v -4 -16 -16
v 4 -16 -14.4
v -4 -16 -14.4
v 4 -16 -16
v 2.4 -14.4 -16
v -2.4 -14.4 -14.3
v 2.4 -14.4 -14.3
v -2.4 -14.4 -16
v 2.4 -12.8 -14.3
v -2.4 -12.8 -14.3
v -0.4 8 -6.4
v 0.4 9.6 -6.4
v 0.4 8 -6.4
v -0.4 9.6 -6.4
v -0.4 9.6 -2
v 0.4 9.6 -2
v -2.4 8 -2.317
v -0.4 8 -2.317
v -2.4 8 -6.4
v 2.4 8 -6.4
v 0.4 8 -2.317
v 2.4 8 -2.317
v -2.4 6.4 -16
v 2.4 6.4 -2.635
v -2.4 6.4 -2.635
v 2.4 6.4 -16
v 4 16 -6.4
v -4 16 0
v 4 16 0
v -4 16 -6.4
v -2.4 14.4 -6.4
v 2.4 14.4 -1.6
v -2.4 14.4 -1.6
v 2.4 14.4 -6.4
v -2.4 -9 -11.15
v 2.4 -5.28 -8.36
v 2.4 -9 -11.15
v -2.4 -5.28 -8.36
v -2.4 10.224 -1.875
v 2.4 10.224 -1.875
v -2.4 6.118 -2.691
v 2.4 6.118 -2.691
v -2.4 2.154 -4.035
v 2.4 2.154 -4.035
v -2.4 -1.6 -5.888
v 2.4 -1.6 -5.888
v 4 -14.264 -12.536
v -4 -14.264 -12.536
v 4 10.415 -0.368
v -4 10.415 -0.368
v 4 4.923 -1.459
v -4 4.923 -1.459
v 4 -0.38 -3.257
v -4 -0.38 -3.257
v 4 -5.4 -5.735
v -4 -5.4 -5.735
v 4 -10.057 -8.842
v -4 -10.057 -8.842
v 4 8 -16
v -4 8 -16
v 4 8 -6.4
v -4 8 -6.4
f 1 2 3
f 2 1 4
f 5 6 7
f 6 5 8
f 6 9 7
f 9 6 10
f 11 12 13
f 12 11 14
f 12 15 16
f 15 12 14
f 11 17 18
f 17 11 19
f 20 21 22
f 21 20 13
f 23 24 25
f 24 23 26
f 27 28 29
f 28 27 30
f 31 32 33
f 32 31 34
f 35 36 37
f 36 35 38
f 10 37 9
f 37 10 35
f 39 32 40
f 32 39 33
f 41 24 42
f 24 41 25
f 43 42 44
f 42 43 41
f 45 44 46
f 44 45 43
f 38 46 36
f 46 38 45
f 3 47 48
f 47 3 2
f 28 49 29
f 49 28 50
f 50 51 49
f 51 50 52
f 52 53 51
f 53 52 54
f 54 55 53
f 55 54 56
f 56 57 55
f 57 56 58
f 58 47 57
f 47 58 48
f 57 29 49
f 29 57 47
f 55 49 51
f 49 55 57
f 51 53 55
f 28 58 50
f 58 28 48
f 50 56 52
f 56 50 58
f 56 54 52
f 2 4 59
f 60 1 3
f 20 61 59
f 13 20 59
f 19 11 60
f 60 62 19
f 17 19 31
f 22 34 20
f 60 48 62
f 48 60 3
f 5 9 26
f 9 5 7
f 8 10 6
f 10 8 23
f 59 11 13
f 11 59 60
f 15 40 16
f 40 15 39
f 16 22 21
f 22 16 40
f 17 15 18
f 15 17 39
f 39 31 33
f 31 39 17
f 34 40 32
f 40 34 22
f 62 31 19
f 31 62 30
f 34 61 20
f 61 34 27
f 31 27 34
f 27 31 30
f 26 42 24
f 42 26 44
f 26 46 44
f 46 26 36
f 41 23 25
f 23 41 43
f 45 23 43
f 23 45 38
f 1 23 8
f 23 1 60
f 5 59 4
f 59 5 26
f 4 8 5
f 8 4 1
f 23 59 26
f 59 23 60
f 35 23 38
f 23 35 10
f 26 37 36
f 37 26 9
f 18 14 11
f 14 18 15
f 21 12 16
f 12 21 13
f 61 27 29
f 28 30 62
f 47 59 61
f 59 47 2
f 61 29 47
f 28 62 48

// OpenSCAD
// file: ../p/48/1-8edge.scad
use <../../lib.scad>
function ldraw_lib__48__1_8edge() = [
// 0 Hi-Res Circle 0.125
// 0 Name: 48\1-8edge.dat
// 0 Author: [PTadmin]
// 0 !LDRAW_ORG 48_Primitive UPDATE 2017-01
// 0 !LICENSE Licensed under CC BY 4.0 : see CAreadme.txt
// 
// 0 BFC CERTIFY CCW
  [0,"BFC","CERTIFY"],
  [0,"BFC","CCW"],
// 
// 0 !HISTORY 2000-09-30 [PTadmin] Official Update 2000-02
// 0 !HISTORY 2007-10-13 [PTadmin] Header formatted for Contributor Agreement
// 0 !HISTORY 2008-07-01 [PTadmin] Official Update 2008-01
// 0 !HISTORY 2017-01-17 [Steffen] added BFC CERTIFY statement
// 0 !HISTORY 2017-12-30 [PTadmin] Official Update 2017-01
// 
// 
// 2 24 1 0 0 0.9914 0 0.1305
  [2,24,1,0,0,0.9914,0,0.1305],
// 2 24 0.9914 0 0.1305 0.9659 0 0.2588
  [2,24,0.9914,0,0.1305,0.9659,0,0.2588],
// 2 24 0.9659 0 0.2588 0.9239 0 0.3827
  [2,24,0.9659,0,0.2588,0.9239,0,0.3827],
// 2 24 0.9239 0 0.3827 0.866 0 0.5
  [2,24,0.9239,0,0.3827,0.866,0,0.5],
// 2 24 0.866 0 0.5 0.7934 0 0.6088
  [2,24,0.866,0,0.5,0.7934,0,0.6088],
// 2 24 0.7934 0 0.6088 0.7071 0 0.7071
  [2,24,0.7934,0,0.6088,0.7071,0,0.7071],
];
module ldraw_lib__48__1_8edge(step=0, col=false, unit=2/5, alt=false, line=0.2, solid=!$preview)
    makepoly(ldraw_lib__48__1_8edge(), step=step, col=col, unit=unit, alt=alt, line=line, solid=solid);
ldraw_lib__48__1_8edge(line=0.2);
// file: ../p/48/1-8cyli.scad
use <../../lib.scad>
function ldraw_lib__48__1_8cyli() = [
// 0 Hi-Res Cylinder 0.125
// 0 Name: 48\1-8cyli.dat
// 0 Author: Steve Bliss [sbliss]
// 0 !LDRAW_ORG 48_Primitive UPDATE 2004-04
// 0 !LICENSE Licensed under CC BY 4.0 : see CAreadme.txt
// 
// 0 BFC CERTIFY CCW
  [0,"BFC","CERTIFY"],
  [0,"BFC","CCW"],
// 
// 0 !HISTORY 2000-05-07 [PTadmin] Official Update 2000-01
// 0 !HISTORY 2004-10-12 [sbliss] fixed title, BFC'ed
// 0 !HISTORY 2004-11-06 [PTadmin] Official Update 2004-04
// 0 !HISTORY 2007-06-24 [PTadmin] Header formatted for Contributor Agreement
// 0 !HISTORY 2008-07-01 [PTadmin] Official Update 2008-01
// 
// 
// 5 24 1 0 0 1 1 0 0.9914 0 0.1305 1 0 -1
  [5,24,1,0,0,1,1,0,0.9914,0,0.1305,1,0,-1],
// 5 24 0.9914 0 0.1305 0.9914 1 0.1305 0.9659 0 0.2588 1 0 0
  [5,24,0.9914,0,0.1305,0.9914,1,0.1305,0.9659,0,0.2588,1,0,0],
// 5 24 0.9659 0 0.2588 0.9659 1 0.2588 0.9239 0 0.3827 0.9914 0 0.1305
  [5,24,0.9659,0,0.2588,0.9659,1,0.2588,0.9239,0,0.3827,0.9914,0,0.1305],
// 5 24 0.9239 0 0.3827 0.9239 1 0.3827 0.8660 0 0.5000 0.9659 0 0.2588
  [5,24,0.9239,0,0.3827,0.9239,1,0.3827,0.8660,0,0.5000,0.9659,0,0.2588],
// 5 24 0.8660 0 0.5000 0.8660 1 0.5000 0.7934 0 0.6088 0.9239 0 0.3827
  [5,24,0.8660,0,0.5000,0.8660,1,0.5000,0.7934,0,0.6088,0.9239,0,0.3827],
// 5 24 0.7934 0 0.6088 0.7934 1 0.6088 0.7071 0 0.7071 0.8660 0 0.5000
  [5,24,0.7934,0,0.6088,0.7934,1,0.6088,0.7071,0,0.7071,0.8660,0,0.5000],
// 5 24 0.7071 0 0.7071 0.7071 1 0.7071 0.6088 0 0.7934 0.7934 0 0.6088
  [5,24,0.7071,0,0.7071,0.7071,1,0.7071,0.6088,0,0.7934,0.7934,0,0.6088],
// 
// 4 16 0.9914 1 0.1305 0.9914 0 0.1305 1 0 0 1 1 0
  [4,16,0.9914,1,0.1305,0.9914,0,0.1305,1,0,0,1,1,0],
// 4 16 0.9659 1 0.2588 0.9659 0 0.2588 0.9914 0 0.1305 0.9914 1 0.1305
  [4,16,0.9659,1,0.2588,0.9659,0,0.2588,0.9914,0,0.1305,0.9914,1,0.1305],
// 4 16 0.9239 1 0.3827 0.9239 0 0.3827 0.9659 0 0.2588 0.9659 1 0.2588
  [4,16,0.9239,1,0.3827,0.9239,0,0.3827,0.9659,0,0.2588,0.9659,1,0.2588],
// 4 16 0.8660 1 0.5000 0.8660 0 0.5000 0.9239 0 0.3827 0.9239 1 0.3827
  [4,16,0.8660,1,0.5000,0.8660,0,0.5000,0.9239,0,0.3827,0.9239,1,0.3827],
// 4 16 0.7934 1 0.6088 0.7934 0 0.6088 0.8660 0 0.5000 0.8660 1 0.5000
  [4,16,0.7934,1,0.6088,0.7934,0,0.6088,0.8660,0,0.5000,0.8660,1,0.5000],
// 4 16 0.7071 1 0.7071 0.7071 0 0.7071 0.7934 0 0.6088 0.7934 1 0.6088
  [4,16,0.7071,1,0.7071,0.7071,0,0.7071,0.7934,0,0.6088,0.7934,1,0.6088],
// 0
];
module ldraw_lib__48__1_8cyli(step=0, col=false, unit=2/5, alt=false, line=0.2, solid=!$preview)
    makepoly(ldraw_lib__48__1_8cyli(), step=step, col=col, unit=unit, alt=alt, line=line, solid=solid);
ldraw_lib__48__1_8cyli(line=0.2);
// file: ../p/rect3.scad
use <../lib.scad>
function ldraw_lib__rect3() = [
// 0 Rectangle with 3 Edges
// 0 Name: rect3.dat
// 0 Author: Mark Kennedy [mkennedy]
// 0 !LDRAW_ORG Primitive UPDATE 2010-01
// 0 !LICENSE Licensed under CC BY 4.0 : see CAreadme.txt
// 
// 0 BFC CERTIFY CCW
  [0,"BFC","CERTIFY"],
  [0,"BFC","CCW"],
// 
// 0 !HISTORY 2003-08-01 [PTadmin] Official Update 2003-02
// 0 !HISTORY 2007-06-24 [PTadmin] Header formatted for Contributor Agreement
// 0 !HISTORY 2008-07-01 [PTadmin] Official Update 2008-01
// 0 !HISTORY 2010-01-17 [mikeheide] Change winding to CCW
// 0 !HISTORY 2010-04-05 [PTadmin] Official Update 2010-01
// 
// 
// 2 24 1 0 1 -1 0 1
  [2,24,1,0,1,-1,0,1],
// 2 24 1 0 1 1 0 -1
  [2,24,1,0,1,1,0,-1],
// 2 24 -1 0 1 -1 0 -1
  [2,24,-1,0,1,-1,0,-1],
// 4 16 -1 0 1 -1 0 -1 1 0 -1 1 0 1
  [4,16,-1,0,1,-1,0,-1,1,0,-1,1,0,1],
// 0 //
];
module ldraw_lib__rect3(step=0, col=false, unit=2/5, alt=false, line=0.2, solid=!$preview)
    makepoly(ldraw_lib__rect3(), step=step, col=col, unit=unit, alt=alt, line=line, solid=solid);
ldraw_lib__rect3(line=0.2);
// file: ../p/rect2p.scad
use <../lib.scad>
function ldraw_lib__rect2p() = [
// 0 Rectangle with 2 Parallel Edges
// 0 Name: rect2p.dat
// 0 Author: Donald Sutter [technog]
// 0 !LDRAW_ORG Primitive UPDATE 2010-01
// 0 !LICENSE Licensed under CC BY 4.0 : see CAreadme.txt
// 
// 0 BFC CERTIFY CCW
  [0,"BFC","CERTIFY"],
  [0,"BFC","CCW"],
// 
// 0 !HISTORY 2003-08-01 [PTadmin] Official Update 2003-02
// 0 !HISTORY 2007-06-24 [PTadmin] Header formatted for Contributor Agreement
// 0 !HISTORY 2008-07-01 [PTadmin] Official Update 2008-01
// 0 !HISTORY 2010-01-17 [mikeheide] changed winding to CCW
// 0 !HISTORY 2010-04-05 [PTadmin] Official Update 2010-01
// 
// 
// 2 24 1 0 1 -1 0 1
  [2,24,1,0,1,-1,0,1],
// 2 24 -1 0 -1 1 0 -1
  [2,24,-1,0,-1,1,0,-1],
// 4 16 -1 0 1 -1 0 -1 1 0 -1 1 0 1
  [4,16,-1,0,1,-1,0,-1,1,0,-1,1,0,1],
// 0
];
module ldraw_lib__rect2p(step=0, col=false, unit=2/5, alt=false, line=0.2, solid=!$preview)
    makepoly(ldraw_lib__rect2p(), step=step, col=col, unit=unit, alt=alt, line=line, solid=solid);
ldraw_lib__rect2p(line=0.2);
// file: ../p/rect.scad
use <../lib.scad>
function ldraw_lib__rect() = [
// 0 Rectangle
// 0 Name: rect.dat
// 0 Author: James Jessiman
// 0 !LDRAW_ORG Primitive UPDATE 2010-01
// 0 !LICENSE Licensed under CC BY 4.0 : see CAreadme.txt
// 
// 0 BFC CERTIFY CCW
  [0,"BFC","CERTIFY"],
  [0,"BFC","CCW"],
// 
// 0 !HISTORY 2002-04-05 [hafhead] Added BFC statement
// 0 !HISTORY 2002-04-25 [PTadmin] Official Update 2002-02
// 0 !HISTORY 2007-06-24 [PTadmin] Header formatted for Contributor Agreement
// 0 !HISTORY 2008-07-01 [PTadmin] Official Update 2008-01
// 0 !HISTORY 2010-01-17 [mikeheide] changed winding to CCW
// 0 !HISTORY 2010-04-05 [PTadmin] Official Update 2010-01
// 
// 
// 2 24 1 0 1 -1 0 1
  [2,24,1,0,1,-1,0,1],
// 2 24 -1 0 1 -1 0 -1
  [2,24,-1,0,1,-1,0,-1],
// 2 24 -1 0 -1 1 0 -1
  [2,24,-1,0,-1,1,0,-1],
// 2 24 1 0 -1 1 0 1
  [2,24,1,0,-1,1,0,1],
// 4 16 -1 0 1 -1 0 -1 1 0 -1 1 0 1
  [4,16,-1,0,1,-1,0,-1,1,0,-1,1,0,1],
// 0
];
module ldraw_lib__rect(step=0, col=false, unit=2/5, alt=false, line=0.2, solid=!$preview)
    makepoly(ldraw_lib__rect(), step=step, col=col, unit=unit, alt=alt, line=line, solid=solid);
ldraw_lib__rect(line=0.2);
// file: ../p/box2-5.scad
use <../lib.scad>
function ldraw_lib__box2_5() = [
// 0 Box with 2 Faces without 5 Edges
// 0 Name: box2-5.dat
// 0 Author: Steffen [Steffen]
// 0 !LDRAW_ORG Primitive UPDATE 2003-03
// 0 !LICENSE Licensed under CC BY 4.0 : see CAreadme.txt
// 
// 0 BFC CERTIFY CCW
  [0,"BFC","CERTIFY"],
  [0,"BFC","CCW"],
// 
// 0 !HISTORY 2003-12-19 [PTadmin] Official Update 2003-03
// 0 !HISTORY 2007-06-24 [PTadmin] Header formatted for Contributor Agreement
// 0 !HISTORY 2008-07-01 [PTadmin] Official Update 2008-01
// 
// 
// 2 24 1 1 1 -1 1 1
  [2,24,1,1,1,-1,1,1],
// 2 24 1 1 -1 -1 1 -1
  [2,24,1,1,-1,-1,1,-1],
// 2 24 1 -1 1 -1 -1 1
  [2,24,1,-1,1,-1,-1,1],
// 2 24 -1 -1 1 -1 1 1
  [2,24,-1,-1,1,-1,1,1],
// 2 24 1 -1 1 1 1 1
  [2,24,1,-1,1,1,1,1],
// 2 24 -1 1 -1 -1 1 1
  [2,24,-1,1,-1,-1,1,1],
// 2 24 1 1 -1 1 1 1
  [2,24,1,1,-1,1,1,1],
// 4 16 1 1 1 1 1 -1 -1 1 -1 -1 1 1
  [4,16,1,1,1,1,1,-1,-1,1,-1,-1,1,1],
// 4 16 1 1 1 -1 1 1 -1 -1 1 1 -1 1
  [4,16,1,1,1,-1,1,1,-1,-1,1,1,-1,1],
// 0
];
module ldraw_lib__box2_5(step=0, col=false, unit=2/5, alt=false, line=0.2, solid=!$preview)
    makepoly(ldraw_lib__box2_5(), step=step, col=col, unit=unit, alt=alt, line=line, solid=solid);
ldraw_lib__box2_5(line=0.2);
// file: ../p/48/1-8cylo.scad
use <../../lib.scad>
use <1-8cyli.scad>
use <1-8edge.scad>
function ldraw_lib__48__1_8cylo() = [
// 0 Hi-Res Cylinder Open 0.125
// 0 Name: 48\1-8cylo.dat
// 0 Author: Max Martin Richter [MMR1988]
// 0 !LDRAW_ORG 48_Primitive UPDATE 2014-01
// 0 !LICENSE Licensed under CC BY 4.0 : see CAreadme.txt
// 
// 0 BFC CERTIFY CCW
  [0,"BFC","CERTIFY"],
  [0,"BFC","CCW"],
// 
// 0 !HISTORY 2014-06-21 [PTadmin] Official Update 2014-01
// 
// 
// 1 16 0 0 0 1 0 0 0 1 0 0 0 1 48\1-8edge.dat
  [1,16,0,0,0,1,0,0,0,1,0,0,0,1, ldraw_lib__48__1_8edge()],
// 1 16 0 1 0 1 0 0 0 1 0 0 0 1 48\1-8edge.dat
  [1,16,0,1,0,1,0,0,0,1,0,0,0,1, ldraw_lib__48__1_8edge()],
// 1 16 0 0 0 1 0 0 0 1 0 0 0 1 48\1-8cyli.dat
  [1,16,0,0,0,1,0,0,0,1,0,0,0,1, ldraw_lib__48__1_8cyli()],
];
module ldraw_lib__48__1_8cylo(step=0, col=false, unit=2/5, alt=false, line=0.2, solid=!$preview)
    makepoly(ldraw_lib__48__1_8cylo(), step=step, col=col, unit=unit, alt=alt, line=line, solid=solid);
ldraw_lib__48__1_8cylo(line=0.2);
// file: ../p/48/1-8chrd.scad
use <../../lib.scad>
function ldraw_lib__48__1_8chrd() = [
// 0 Hi-Res Chord 0.125
// 0 Name: 48\1-8chrd.dat
// 0 Author: Willy Tschager [Holly-Wood]
// 0 !LDRAW_ORG 48_Primitive UPDATE 2024-01
// 0 !LICENSE Licensed under CC BY 4.0 : see CAreadme.txt
// 
// 0 BFC CERTIFY CCW
  [0,"BFC","CERTIFY"],
  [0,"BFC","CCW"],
// 
// 0 !HISTORY 2009-05-02 [PTadmin] Official Update 2009-01
// 0 !HISTORY 2024-01-04 [Holly-Wood] Complete re-write, original by guyvivan
// 0 !HISTORY 2024-01-29 [OrionP] Official Update 2024-01
// 
// 0 // Vertices calculated by LDPartEditor (PrimGen 2.X)
// 
// 4 16 .7071 0 .7071 1 0 0 .9914 0 .1305 .7934 0 .6088
  [4,16,.7071,0,.7071,1,0,0,.9914,0,.1305,.7934,0,.6088],
// 4 16 .7934 0 .6088 .9914 0 .1305 .9659 0 .2588 .866 0 .5
  [4,16,.7934,0,.6088,.9914,0,.1305,.9659,0,.2588,.866,0,.5],
// 3 16 .866 0 .5 .9659 0 .2588 .9239 0 .3827
  [3,16,.866,0,.5,.9659,0,.2588,.9239,0,.3827],
];
module ldraw_lib__48__1_8chrd(step=0, col=false, unit=2/5, alt=false, line=0.2, solid=!$preview)
    makepoly(ldraw_lib__48__1_8chrd(), step=step, col=col, unit=unit, alt=alt, line=line, solid=solid);
ldraw_lib__48__1_8chrd(line=0.2);
// main file
use <../lib.scad>
use <../p/48/1-8chrd.scad>
use <../p/48/1-8cylo.scad>
use <../p/box2-5.scad>
use <../p/rect.scad>
use <../p/rect2p.scad>
use <../p/rect3.scad>
function ldraw_lib__3573() = [
// 0 Slope Brick Curved  4 x  1 x  1.667
// 0 Name: 3573.dat
// 0 Author: Magnus Forsberg [MagFors]
// 0 !LDRAW_ORG Part UPDATE 2025-09
// 0 !LICENSE Licensed under CC BY 4.0 : see CAreadme.txt
// 
// 0 BFC CERTIFY CCW
  [0,"BFC","CERTIFY"],
  [0,"BFC","CCW"],
// 
// 0 !HISTORY 2025-09-29 [OrionP] Official Update 2025-09
// 
// 1 16 0 38 -40 -10 0 0 0 0 2 0 1 0 rect3.dat
  [1,16,0,38,-40,-10,0,0,0,0,2,0,1,0, ldraw_lib__rect3()],
// 0 BFC INVERTNEXT
  [0,"BFC","INVERTNEXT"],
// 1 16 0 37.875 -34 6 0 0 0 0 -2.125 0 -2 0 box2-5.dat
  [1,16,0,37.875,-34,6,0,0,0,0,-2.125,0,-2,0, ldraw_lib__box2_5()],
// 1 16 0 10.5 22 -1 0 0 0 5.5 0 0 0 2 box2-5.dat
  [1,16,0,10.5,22,-1,0,0,0,5.5,0,0,0,2, ldraw_lib__box2_5()],
// 1 16 -3.5 10.896375 20 -2.5 0 0 0 0 -5.103625 0 -1 0 rect3.dat
  [1,16,-3.5,10.896375,20,-2.5,0,0,0,0,-5.103625,0,-1,0, ldraw_lib__rect3()],
// 1 16 3.5 10.896375 20 -2.5 0 0 0 0 -5.103625 0 -1 0 rect3.dat
  [1,16,3.5,10.896375,20,-2.5,0,0,0,0,-5.103625,0,-1,0, ldraw_lib__rect3()],
// 1 16 0 23.294 16 -6 0 0 0 0 16.706 0 1 0 rect.dat
  [1,16,0,23.294,16,-6,0,0,0,0,16.706,0,1,0, ldraw_lib__rect()],
// 1 16 0 8 40 0 0 -10 8 0 0 0 -1 0 rect.dat
  [1,16,0,8,40,0,0,-10,8,0,0,0,-1,0, ldraw_lib__rect()],
// 1 16 0 10 36 0 0 6 6 0 0 0 1 0 rect.dat
  [1,16,0,10,36,0,0,6,6,0,0,0,1,0, ldraw_lib__rect()],
// 1 16 0 24.3875 -17.85 0 0 6 -3.4875 -1 0 4.65 0 0 rect2p.dat
  [1,16,0,24.3875,-17.85,0,0,6,-3.4875,-1,0,4.65,0,0, ldraw_lib__rect2p()],
// 1 16 0 31.8125 -27.25 0 0 -6 3.9375 -1 0 -4.75 0 0 rect2p.dat
  [1,16,0,31.8125,-27.25,0,0,-6,3.9375,-1,0,-4.75,0,0, ldraw_lib__rect2p()],
// 1 16 0 4.344 30.78 0 0 -6 .344 -1 0 -5.22 0 0 rect2p.dat
  [1,16,0,4.344,30.78,0,0,-6,.344,-1,0,-5.22,0,0, ldraw_lib__rect2p()],
// 1 16 0 6.658 15.648 0 0 -6 .07 -1 0 -.352 0 0 rect2p.dat
  [1,16,0,6.658,15.648,0,0,-6,.07,-1,0,-.352,0,0, ldraw_lib__rect2p()],
// 1 16 0 8.408 10.34 0 0 -6 1.68 -1 0 -4.956 0 0 rect2p.dat
  [1,16,0,8.408,10.34,0,0,-6,1.68,-1,0,-4.956,0,0, ldraw_lib__rect2p()],
// 1 16 0 12.404 .692 0 0 -6 2.316 -1 0 -4.692 0 0 rect2p.dat
  [1,16,0,12.404,.692,0,0,-6,2.316,-1,0,-4.692,0,0, ldraw_lib__rect2p()],
// 1 16 0 17.81 -8.6 0 0 -6 3.09 -1 0 -4.6 0 0 rect2p.dat
  [1,16,0,17.81,-8.6,0,0,-6,3.09,-1,0,-4.6,0,0, ldraw_lib__rect2p()],
// 
// 2 24 -10 36 -40 10 36 -40
  [2,24,-10,36,-40,10,36,-40],
// 2 24 -10 36 -40 -10 31.3403 -35.6597
  [2,24,-10,36,-40,-10,31.3403,-35.6597],
// 2 24 10 36 -40 10 31.3403 -35.6597
  [2,24,10,36,-40,10,31.3403,-35.6597],
// 4 16 -10 31.3403 -35.6597 -10 36 -40 10 36 -40 10 31.3403 -35.6597
  [4,16,-10,31.3403,-35.6597,-10,36,-40,10,36,-40,10,31.3403,-35.6597],
// 1 16 10 107 40 0 -20 0 -107 0 0 0 0 -107 48\1-8cylo.dat
  [1,16,10,107,40,0,-20,0,-107,0,0,0,0,-107, ldraw_lib__48__1_8cylo()],
// 1 16 10 107 40 0 -1 0 -107 0 0 0 0 -107 48\1-8chrd.dat
  [1,16,10,107,40,0,-1,0,-107,0,0,0,0,-107, ldraw_lib__48__1_8chrd()],
// 1 16 -10 107 40 0 1 0 -107 0 0 0 0 -107 48\1-8chrd.dat
  [1,16,-10,107,40,0,1,0,-107,0,0,0,0,-107, ldraw_lib__48__1_8chrd()],
// 
// 2 24 -10 40 20 10 40 20
  [2,24,-10,40,20,10,40,20],
// 2 24 10 40 20 10 40 -40
  [2,24,10,40,20,10,40,-40],
// 2 24 -10 40 -40 -10 40 20
  [2,24,-10,40,-40,-10,40,20],
// 2 24 6 40 16 6 40 -36
  [2,24,6,40,16,6,40,-36],
// 2 24 -6 40 -36 -6 40 16
  [2,24,-6,40,-36,-6,40,16],
// 2 24 -10 40 20 -10 16 20
  [2,24,-10,40,20,-10,16,20],
// 2 24 10 16 20 10 40 20
  [2,24,10,16,20,10,40,20],
// 2 24 -10 16 40 -10 16 20
  [2,24,-10,16,40,-10,16,20],
// 2 24 10 16 20 10 16 40
  [2,24,10,16,20,10,16,40],
// 2 24 6 4.688 25.56 6 5.79275 20
  [2,24,6,4.688,25.56,6,5.79275,20],
// 2 24 -6 4.688 25.56 -6 5.79275 20
  [2,24,-6,4.688,25.56,-6,5.79275,20],
// 2 24 -6 16 36 -6 16 20
  [2,24,-6,16,36,-6,16,20],
// 2 24 6 16 36 6 16 20
  [2,24,6,16,36,6,16,20],
// 2 24 6 16 20 10 16 20
  [2,24,6,16,20,10,16,20],
// 2 24 -6 16 20 -10 16 20
  [2,24,-6,16,20,-10,16,20],
// 2 24 -1 5 24 -1 5.79275 20
  [2,24,-1,5,24,-1,5.79275,20],
// 2 24 1 5 24 1 5.79275 20
  [2,24,1,5,24,1,5.79275,20],
// 
// 3 16 10 36 -40 10 40 -40 10 40 20
  [3,16,10,36,-40,10,40,-40,10,40,20],
// 3 16 -10 40 20 -10 40 -40 -10 36 -40
  [3,16,-10,40,20,-10,40,-40,-10,36,-40],
// 3 16 6 16 20 10 16 20 10 40 20
  [3,16,6,16,20,10,16,20,10,40,20],
// 3 16 1 16 20 6 16 20 10 40 20
  [3,16,1,16,20,6,16,20,10,40,20],
// 3 16 -6 16 20 -1 16 20 -10 40 20
  [3,16,-6,16,20,-1,16,20,-10,40,20],
// 3 16 -10 40 20 -10 16 20 -6 16 20
  [3,16,-10,40,20,-10,16,20,-6,16,20],
// 3 16 -6 5.79275 20 -6 16 20 -6 16 36
  [3,16,-6,5.79275,20,-6,16,20,-6,16,36],
// 3 16 6 5.79275 20 6 16 36 6 16 20
  [3,16,6,5.79275,20,6,16,36,6,16,20],
// 4 16 -10 36 -40 -10 31.3403 -35.6597 -10 16 20 -10 40 20
  [4,16,-10,36,-40,-10,31.3403,-35.6597,-10,16,20,-10,40,20],
// 4 16 6 40 16 6 40 -36 6 35.75 -36 6 35.75 -32
  [4,16,6,40,16,6,40,-36,6,35.75,-36,6,35.75,-32],
// 4 16 -6 35.75 -36 -6 40 -36 -6 40 16 -6 35.75 -32
  [4,16,-6,35.75,-36,-6,40,-36,-6,40,16,-6,35.75,-32],
// 4 16 10 40 20 -10 40 20 -1 16 20 1 16 20
  [4,16,10,40,20,-10,40,20,-1,16,20,1,16,20],
// 4 16 1 5 24 -1 5 24 -6 4.688 25.56 6 4.688 25.56
  [4,16,1,5,24,-1,5,24,-6,4.688,25.56,6,4.688,25.56],
// 4 16 6 4.688 25.56 6 5.79275 20 1 5.79275 20 1 5 24
  [4,16,6,4.688,25.56,6,5.79275,20,1,5.79275,20,1,5,24],
// 4 16 -1 5 24 -1 5.79275 20 -6 5.79275 20 -6 4.688 25.56
  [4,16,-1,5,24,-1,5.79275,20,-6,5.79275,20,-6,4.688,25.56],
// 4 16 -6 4 36 -6 4.688 25.56 -6 5.79275 20 -6 16 36
  [4,16,-6,4,36,-6,4.688,25.56,-6,5.79275,20,-6,16,36],
// 4 16 6 4 36 6 16 36 6 5.79275 20 6 4.688 25.56
  [4,16,6,4,36,6,16,36,6,5.79275,20,6,4.688,25.56],
// 4 16 -6 16 20 -10 16 20 -10 16 40 -6 16 36
  [4,16,-6,16,20,-10,16,20,-10,16,40,-6,16,36],
// 4 16 6 16 20 6 16 36 10 16 40 10 16 20
  [4,16,6,16,20,6,16,36,10,16,40,10,16,20],
// 4 16 10 16 40 6 16 36 -6 16 36 -10 16 40
  [4,16,10,16,40,6,16,36,-6,16,36,-10,16,40],
// 4 16 6 10.088 5.384 6 6.728 15.296 6 6.588 16 6 40 16
  [4,16,6,10.088,5.384,6,6.728,15.296,6,6.588,16,6,40,16],
// 4 16 6 10.088 5.384 6 40 16 6 20.9 -13.2 6 14.72 -4
  [4,16,6,10.088,5.384,6,40,16,6,20.9,-13.2,6,14.72,-4],
// 4 16 -6 40 16 -6 6.588 16 -6 6.728 15.296 -6 10.088 5.384
  [4,16,-6,40,16,-6,6.588,16,-6,6.728,15.296,-6,10.088,5.384],
// 4 16 -6 10.088 5.384 -6 14.72 -4 -6 20.9 -13.2 -6 40 16
  [4,16,-6,10.088,5.384,-6,14.72,-4,-6,20.9,-13.2,-6,40,16],
// 4 16 -6 40 -36 -10 40 -40 -10 40 20 -6 40 16
  [4,16,-6,40,-36,-10,40,-40,-10,40,20,-6,40,16],
// 4 16 6 40 -36 6 40 16 10 40 20 10 40 -40
  [4,16,6,40,-36,6,40,16,10,40,20,10,40,-40],
// 4 16 -6 40 -36 6 40 -36 10 40 -40 -10 40 -40
  [4,16,-6,40,-36,6,40,-36,10,40,-40,-10,40,-40],
// 4 16 -6 40 16 -10 40 20 10 40 20 6 40 16
  [4,16,-6,40,16,-10,40,20,10,40,20,6,40,16],
// 4 16 -6 40 16 -6 20.9 -13.2 -6 27.875 -22.5 -6 35.75 -32
  [4,16,-6,40,16,-6,20.9,-13.2,-6,27.875,-22.5,-6,35.75,-32],
// 4 16 6 27.875 -22.5 6 20.9 -13.2 6 40 16 6 35.75 -32
  [4,16,6,27.875,-22.5,6,20.9,-13.2,6,40,16,6,35.75,-32],
// 4 16 -1 16 20 -1 5.79275 20 -1 5 24 -1 16 24
  [4,16,-1,16,20,-1,5.79275,20,-1,5,24,-1,16,24],
// 4 16 1 16 24 1 5 24 1 5.79275 20 1 16 20
  [4,16,1,16,24,1,5,24,1,5.79275,20,1,16,20],
// 3 16 10 16 20 10 16 40 10 0 40
  [3,16,10,16,20,10,16,40,10,0,40],
// 3 16 -10 0 40 -10 16 40 -10 16 20
  [3,16,-10,0,40,-10,16,40,-10,16,20],
// 4 16 10 16 20 10 31.3403 -35.6597 10 36 -40 10 40 20
  [4,16,10,16,20,10,31.3403,-35.6597,10,36,-40,10,40,20],
// 5 24 10 31.3403 -35.6597 -10 31.3403 -35.6597 10 36 -40 10 22.1062 -25.1416
  [5,24,10,31.3403,-35.6597,-10,31.3403,-35.6597,10,36,-40,10,22.1062,-25.1416],
// 
// 5 24 -6 6.728 15.296 6 6.728 15.296 -6 4.688 25.56 -6 10.088 5.384
  [5,24,-6,6.728,15.296,6,6.728,15.296,-6,4.688,25.56,-6,10.088,5.384],
// 5 24 -6 10.088 5.384 6 10.088 5.384 -6 6.728 15.296 -6 14.72 -4
  [5,24,-6,10.088,5.384,6,10.088,5.384,-6,6.728,15.296,-6,14.72,-4],
// 5 24 -6 14.72 -4 6 14.72 -4 -6 10.088 5.384 -6 20.9 -13.2
  [5,24,-6,14.72,-4,6,14.72,-4,-6,10.088,5.384,-6,20.9,-13.2],
// 5 24 -6 20.9 -13.2 6 20.9 -13.2 -6 14.72 -4 -6 27.875 -22.5
  [5,24,-6,20.9,-13.2,6,20.9,-13.2,-6,14.72,-4,-6,27.875,-22.5],
// 5 24 -6 27.875 -22.5 6 27.875 -22.5 -6 35.75 -32 -6 20.9 -13.2
  [5,24,-6,27.875,-22.5,6,27.875,-22.5,-6,35.75,-32,-6,20.9,-13.2],
// 5 24 -6 4.688 25.56 6 4.688 25.56 -6 4 36 -6 6.728 15.296
  [5,24,-6,4.688,25.56,6,4.688,25.56,-6,4,36,-6,6.728,15.296],
// 3 16 10 16 20 10 0 40 10 31.3403 -35.6597
  [3,16,10,16,20,10,0,40,10,31.3403,-35.6597],
// 3 16 -10 0 40 -10 16 20 -10 31.3403 -35.6597
  [3,16,-10,0,40,-10,16,20,-10,31.3403,-35.6597],
];
module ldraw_lib__3573(step=0, col=false, unit=2/5, alt=false, line=0.2, solid=!$preview)
    makepoly(ldraw_lib__3573(), step=step, col=col, unit=unit, alt=alt, line=line, solid=solid);
ldraw_lib__3573(line=0.2);
